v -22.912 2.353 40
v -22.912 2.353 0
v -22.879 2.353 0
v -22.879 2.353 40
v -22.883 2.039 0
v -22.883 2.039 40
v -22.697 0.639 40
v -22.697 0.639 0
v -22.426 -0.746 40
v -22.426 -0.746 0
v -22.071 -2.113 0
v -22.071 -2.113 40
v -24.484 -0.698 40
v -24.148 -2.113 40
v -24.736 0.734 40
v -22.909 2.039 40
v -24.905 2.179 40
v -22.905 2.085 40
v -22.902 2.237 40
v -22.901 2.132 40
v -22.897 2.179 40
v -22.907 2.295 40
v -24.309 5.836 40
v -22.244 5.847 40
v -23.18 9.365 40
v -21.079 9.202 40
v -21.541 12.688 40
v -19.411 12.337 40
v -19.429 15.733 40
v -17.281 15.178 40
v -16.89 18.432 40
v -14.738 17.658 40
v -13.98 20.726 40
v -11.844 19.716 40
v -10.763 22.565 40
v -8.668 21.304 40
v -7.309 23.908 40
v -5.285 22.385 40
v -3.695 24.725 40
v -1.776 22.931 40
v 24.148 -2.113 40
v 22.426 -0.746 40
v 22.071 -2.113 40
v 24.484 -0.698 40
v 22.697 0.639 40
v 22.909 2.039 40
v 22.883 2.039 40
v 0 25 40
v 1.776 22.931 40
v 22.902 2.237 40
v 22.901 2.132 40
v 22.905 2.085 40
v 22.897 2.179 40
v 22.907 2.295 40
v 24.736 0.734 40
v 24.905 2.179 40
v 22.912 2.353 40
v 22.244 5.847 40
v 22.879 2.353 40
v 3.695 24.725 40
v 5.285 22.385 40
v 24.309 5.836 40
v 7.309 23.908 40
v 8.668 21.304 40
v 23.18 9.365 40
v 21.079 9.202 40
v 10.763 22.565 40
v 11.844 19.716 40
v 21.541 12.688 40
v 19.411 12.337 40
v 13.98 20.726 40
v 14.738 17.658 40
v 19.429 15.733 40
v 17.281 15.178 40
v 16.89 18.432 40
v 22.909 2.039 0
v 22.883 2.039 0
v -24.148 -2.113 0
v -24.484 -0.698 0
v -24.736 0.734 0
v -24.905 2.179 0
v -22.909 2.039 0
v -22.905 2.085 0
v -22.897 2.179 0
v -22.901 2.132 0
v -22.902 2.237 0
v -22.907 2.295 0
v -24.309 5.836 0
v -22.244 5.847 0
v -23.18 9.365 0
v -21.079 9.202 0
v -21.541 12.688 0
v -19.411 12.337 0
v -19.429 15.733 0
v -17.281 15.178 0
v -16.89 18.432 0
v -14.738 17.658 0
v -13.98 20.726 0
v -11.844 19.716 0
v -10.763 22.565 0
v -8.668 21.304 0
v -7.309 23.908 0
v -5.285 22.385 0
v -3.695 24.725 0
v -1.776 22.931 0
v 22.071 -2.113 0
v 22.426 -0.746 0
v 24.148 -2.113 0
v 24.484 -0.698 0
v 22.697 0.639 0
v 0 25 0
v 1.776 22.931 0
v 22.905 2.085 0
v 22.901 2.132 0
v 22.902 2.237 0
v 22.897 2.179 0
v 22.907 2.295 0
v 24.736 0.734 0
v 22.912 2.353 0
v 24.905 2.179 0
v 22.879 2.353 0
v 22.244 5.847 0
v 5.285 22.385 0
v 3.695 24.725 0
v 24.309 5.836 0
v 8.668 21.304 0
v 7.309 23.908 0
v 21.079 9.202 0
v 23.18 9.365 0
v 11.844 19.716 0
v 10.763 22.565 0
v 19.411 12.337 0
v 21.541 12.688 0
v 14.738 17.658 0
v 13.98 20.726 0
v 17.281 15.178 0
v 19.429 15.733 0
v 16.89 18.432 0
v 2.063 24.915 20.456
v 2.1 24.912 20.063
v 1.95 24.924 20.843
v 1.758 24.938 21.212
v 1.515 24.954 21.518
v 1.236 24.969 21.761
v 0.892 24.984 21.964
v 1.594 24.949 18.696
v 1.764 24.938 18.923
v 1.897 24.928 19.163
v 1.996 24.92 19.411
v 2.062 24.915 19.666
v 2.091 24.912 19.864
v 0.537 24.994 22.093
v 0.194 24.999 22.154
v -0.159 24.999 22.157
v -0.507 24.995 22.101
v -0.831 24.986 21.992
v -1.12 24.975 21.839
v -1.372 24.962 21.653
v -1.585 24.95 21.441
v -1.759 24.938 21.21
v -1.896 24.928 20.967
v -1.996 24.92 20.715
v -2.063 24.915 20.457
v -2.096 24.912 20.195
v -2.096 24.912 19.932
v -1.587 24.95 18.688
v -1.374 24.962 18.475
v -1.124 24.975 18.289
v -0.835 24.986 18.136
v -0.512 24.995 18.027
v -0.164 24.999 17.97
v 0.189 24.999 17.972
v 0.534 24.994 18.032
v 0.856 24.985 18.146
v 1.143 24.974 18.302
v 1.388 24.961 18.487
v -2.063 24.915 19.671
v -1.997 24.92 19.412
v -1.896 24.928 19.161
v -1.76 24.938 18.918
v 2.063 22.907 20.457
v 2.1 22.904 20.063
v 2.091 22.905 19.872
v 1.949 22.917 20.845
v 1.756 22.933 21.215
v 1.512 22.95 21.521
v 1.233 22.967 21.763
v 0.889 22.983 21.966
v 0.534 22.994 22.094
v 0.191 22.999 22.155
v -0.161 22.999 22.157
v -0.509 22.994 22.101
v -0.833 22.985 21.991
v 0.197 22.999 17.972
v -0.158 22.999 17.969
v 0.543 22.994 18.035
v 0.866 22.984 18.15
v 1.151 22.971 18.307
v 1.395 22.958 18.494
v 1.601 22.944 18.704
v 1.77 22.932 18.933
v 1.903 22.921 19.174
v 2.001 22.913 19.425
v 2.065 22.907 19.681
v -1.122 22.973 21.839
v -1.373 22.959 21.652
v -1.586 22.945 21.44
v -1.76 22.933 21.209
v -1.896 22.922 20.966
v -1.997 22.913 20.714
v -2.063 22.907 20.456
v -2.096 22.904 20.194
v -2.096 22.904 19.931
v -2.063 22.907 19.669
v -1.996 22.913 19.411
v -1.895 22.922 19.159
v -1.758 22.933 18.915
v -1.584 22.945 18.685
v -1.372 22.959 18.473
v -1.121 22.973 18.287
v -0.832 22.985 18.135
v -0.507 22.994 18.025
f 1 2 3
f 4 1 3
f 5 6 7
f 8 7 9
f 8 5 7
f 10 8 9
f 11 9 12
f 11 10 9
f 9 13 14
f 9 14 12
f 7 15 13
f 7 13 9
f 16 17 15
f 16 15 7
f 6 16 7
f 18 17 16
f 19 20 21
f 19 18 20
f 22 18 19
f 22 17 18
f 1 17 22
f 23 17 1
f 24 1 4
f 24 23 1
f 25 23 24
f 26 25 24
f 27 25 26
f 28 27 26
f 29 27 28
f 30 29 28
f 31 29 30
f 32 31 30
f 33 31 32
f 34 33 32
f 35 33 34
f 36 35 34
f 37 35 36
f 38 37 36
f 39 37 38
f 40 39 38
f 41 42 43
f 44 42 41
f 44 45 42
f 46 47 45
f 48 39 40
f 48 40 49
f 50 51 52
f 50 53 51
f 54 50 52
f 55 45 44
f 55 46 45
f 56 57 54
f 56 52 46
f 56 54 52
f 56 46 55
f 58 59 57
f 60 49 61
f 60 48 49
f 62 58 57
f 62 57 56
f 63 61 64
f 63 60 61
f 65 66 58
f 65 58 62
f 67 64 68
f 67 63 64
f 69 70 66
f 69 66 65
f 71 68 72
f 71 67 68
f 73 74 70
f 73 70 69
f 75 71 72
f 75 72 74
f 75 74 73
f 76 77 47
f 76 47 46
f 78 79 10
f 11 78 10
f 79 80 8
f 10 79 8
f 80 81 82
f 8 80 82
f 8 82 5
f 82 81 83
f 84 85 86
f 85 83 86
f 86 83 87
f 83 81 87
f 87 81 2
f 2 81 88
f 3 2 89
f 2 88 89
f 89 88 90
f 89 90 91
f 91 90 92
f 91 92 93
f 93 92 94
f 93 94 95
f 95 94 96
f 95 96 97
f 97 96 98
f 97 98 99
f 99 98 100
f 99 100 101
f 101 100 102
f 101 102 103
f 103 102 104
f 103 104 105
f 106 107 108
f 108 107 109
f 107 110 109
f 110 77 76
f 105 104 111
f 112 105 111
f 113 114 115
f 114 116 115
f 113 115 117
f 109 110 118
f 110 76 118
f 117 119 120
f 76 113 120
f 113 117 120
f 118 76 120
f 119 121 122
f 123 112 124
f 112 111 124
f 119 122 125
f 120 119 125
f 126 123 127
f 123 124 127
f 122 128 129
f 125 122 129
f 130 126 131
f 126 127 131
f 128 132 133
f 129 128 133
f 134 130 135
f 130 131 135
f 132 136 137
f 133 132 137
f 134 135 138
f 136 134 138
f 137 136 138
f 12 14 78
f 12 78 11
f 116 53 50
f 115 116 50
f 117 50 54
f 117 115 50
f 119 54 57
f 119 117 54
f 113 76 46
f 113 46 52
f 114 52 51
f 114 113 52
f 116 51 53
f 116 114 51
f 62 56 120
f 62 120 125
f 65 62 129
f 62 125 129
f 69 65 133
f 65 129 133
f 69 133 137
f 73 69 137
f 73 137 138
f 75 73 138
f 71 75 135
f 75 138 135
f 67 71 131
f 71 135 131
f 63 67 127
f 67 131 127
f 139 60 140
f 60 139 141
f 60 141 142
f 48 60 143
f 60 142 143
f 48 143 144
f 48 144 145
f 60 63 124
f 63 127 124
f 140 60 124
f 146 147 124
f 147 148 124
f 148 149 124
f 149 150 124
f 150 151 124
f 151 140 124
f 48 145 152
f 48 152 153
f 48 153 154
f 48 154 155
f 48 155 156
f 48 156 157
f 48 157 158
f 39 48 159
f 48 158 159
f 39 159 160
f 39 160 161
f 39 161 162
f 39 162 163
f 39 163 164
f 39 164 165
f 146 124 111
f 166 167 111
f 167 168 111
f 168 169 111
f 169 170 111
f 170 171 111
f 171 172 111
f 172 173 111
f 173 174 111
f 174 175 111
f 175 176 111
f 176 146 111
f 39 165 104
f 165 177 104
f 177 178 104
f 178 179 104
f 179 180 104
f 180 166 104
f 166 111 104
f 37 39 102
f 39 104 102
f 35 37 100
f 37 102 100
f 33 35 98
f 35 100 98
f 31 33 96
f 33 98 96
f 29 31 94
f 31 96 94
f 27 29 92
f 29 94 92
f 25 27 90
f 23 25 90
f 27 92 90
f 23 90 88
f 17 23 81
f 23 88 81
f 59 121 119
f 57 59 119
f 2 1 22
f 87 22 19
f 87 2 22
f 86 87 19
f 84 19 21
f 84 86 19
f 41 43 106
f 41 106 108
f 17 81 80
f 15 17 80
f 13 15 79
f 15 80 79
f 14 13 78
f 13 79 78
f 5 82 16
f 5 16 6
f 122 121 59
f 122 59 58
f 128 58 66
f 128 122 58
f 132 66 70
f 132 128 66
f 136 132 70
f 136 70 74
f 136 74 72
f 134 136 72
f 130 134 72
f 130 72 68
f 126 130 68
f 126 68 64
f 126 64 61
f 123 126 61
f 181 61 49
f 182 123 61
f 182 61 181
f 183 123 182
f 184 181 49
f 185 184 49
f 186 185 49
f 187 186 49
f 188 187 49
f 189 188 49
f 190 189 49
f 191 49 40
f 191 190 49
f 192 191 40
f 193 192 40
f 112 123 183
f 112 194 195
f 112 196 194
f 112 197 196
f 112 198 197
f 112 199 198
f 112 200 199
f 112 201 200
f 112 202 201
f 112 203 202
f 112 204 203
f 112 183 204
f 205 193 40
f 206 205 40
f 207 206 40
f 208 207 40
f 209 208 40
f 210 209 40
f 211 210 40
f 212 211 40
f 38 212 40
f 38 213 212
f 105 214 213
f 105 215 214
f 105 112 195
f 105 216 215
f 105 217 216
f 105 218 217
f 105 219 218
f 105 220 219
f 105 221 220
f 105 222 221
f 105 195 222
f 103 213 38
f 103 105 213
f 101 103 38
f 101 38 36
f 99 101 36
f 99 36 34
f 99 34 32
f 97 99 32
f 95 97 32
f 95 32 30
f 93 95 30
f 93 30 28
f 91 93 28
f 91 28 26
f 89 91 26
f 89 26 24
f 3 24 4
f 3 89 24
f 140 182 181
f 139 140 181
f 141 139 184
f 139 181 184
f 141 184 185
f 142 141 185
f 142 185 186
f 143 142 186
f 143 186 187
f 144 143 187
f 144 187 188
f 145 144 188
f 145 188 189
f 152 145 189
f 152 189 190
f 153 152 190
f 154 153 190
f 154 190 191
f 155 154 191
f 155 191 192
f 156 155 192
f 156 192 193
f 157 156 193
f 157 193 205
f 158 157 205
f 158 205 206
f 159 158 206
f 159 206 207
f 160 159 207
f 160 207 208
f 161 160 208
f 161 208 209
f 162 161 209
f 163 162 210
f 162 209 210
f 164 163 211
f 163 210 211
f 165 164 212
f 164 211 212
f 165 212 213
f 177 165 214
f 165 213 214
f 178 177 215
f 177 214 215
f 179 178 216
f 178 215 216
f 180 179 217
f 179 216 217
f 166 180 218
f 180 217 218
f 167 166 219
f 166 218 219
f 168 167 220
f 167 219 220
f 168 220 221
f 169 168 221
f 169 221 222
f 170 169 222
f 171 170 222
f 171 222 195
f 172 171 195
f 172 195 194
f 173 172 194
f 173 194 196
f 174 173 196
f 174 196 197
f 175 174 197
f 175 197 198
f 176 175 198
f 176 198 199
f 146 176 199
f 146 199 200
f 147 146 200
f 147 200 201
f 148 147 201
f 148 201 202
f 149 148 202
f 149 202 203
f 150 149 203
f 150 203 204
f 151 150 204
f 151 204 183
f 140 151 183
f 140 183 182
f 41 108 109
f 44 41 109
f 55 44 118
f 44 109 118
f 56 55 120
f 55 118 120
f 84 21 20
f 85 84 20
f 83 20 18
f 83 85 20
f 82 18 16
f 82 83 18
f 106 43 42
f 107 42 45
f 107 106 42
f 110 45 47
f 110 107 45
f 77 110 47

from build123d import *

# Parameters (mm, degrees)
PAD008_DEPTH    = 40
POCKET006_DEPTH = 40
POCKET007_DEPTH = 40
SKETCH014_R     = 2.1
POCKET008_DEPTH = 25.001


with BuildPart() as part:
    # Sketch011 → Pad008 (new body)
    with BuildSketch(Plane.XY):
        with BuildLine():
            ThreePointArc((24.9048674523, 2.1788935687), (0, 25), (-24.9048674523, 2.1788935687))
            ThreePointArc((-24.9048674523, 2.1788935687), (-24.620193675, 0.0165817754), (-24.1481451973, -2.1126907965))
            Line((-24.1481451973, -2.1126907965), (24.148145198, -2.1126907965))
            ThreePointArc((24.148145198, -2.1126907965), (24.6201936752, 0.0165817755), (24.9048674523, 2.1788935687))
        make_face()
    extrude(amount=PAD008_DEPTH)

    # Sketch012 → Pocket006 (cut)
    with BuildSketch(Plane.XY):
        with BuildLine():
            ThreePointArc((22.909479324, 2.0385674149), (0, 23), (-22.909479324, 2.0385674149))
            Line((-22.909479324, 2.0385674149), (22.909479324, 2.0385674149))
        make_face()
    extrude(amount=POCKET006_DEPTH, mode=Mode.SUBTRACT)

    # Sketch013 → Pocket007 (cut)
    with BuildSketch(Plane.XY):
        with BuildLine():
            ThreePointArc((-22.912478289, 2.3532080284), (3.93e-08, -18.642213), (22.9124783677, 2.3532080284))
            Line((-22.912478289, 2.3532080284), (22.9124783677, 2.3532080284))
        make_face()
    extrude(amount=POCKET007_DEPTH, mode=Mode.SUBTRACT)

    # Sketch014 → Pocket008 (cut, through all)
    with BuildSketch(Plane.XZ):
        with Locations((0, 20.063227)):
            Circle(SKETCH014_R)
    extrude(amount=-POCKET008_DEPTH, mode=Mode.SUBTRACT)


solid = part.part
